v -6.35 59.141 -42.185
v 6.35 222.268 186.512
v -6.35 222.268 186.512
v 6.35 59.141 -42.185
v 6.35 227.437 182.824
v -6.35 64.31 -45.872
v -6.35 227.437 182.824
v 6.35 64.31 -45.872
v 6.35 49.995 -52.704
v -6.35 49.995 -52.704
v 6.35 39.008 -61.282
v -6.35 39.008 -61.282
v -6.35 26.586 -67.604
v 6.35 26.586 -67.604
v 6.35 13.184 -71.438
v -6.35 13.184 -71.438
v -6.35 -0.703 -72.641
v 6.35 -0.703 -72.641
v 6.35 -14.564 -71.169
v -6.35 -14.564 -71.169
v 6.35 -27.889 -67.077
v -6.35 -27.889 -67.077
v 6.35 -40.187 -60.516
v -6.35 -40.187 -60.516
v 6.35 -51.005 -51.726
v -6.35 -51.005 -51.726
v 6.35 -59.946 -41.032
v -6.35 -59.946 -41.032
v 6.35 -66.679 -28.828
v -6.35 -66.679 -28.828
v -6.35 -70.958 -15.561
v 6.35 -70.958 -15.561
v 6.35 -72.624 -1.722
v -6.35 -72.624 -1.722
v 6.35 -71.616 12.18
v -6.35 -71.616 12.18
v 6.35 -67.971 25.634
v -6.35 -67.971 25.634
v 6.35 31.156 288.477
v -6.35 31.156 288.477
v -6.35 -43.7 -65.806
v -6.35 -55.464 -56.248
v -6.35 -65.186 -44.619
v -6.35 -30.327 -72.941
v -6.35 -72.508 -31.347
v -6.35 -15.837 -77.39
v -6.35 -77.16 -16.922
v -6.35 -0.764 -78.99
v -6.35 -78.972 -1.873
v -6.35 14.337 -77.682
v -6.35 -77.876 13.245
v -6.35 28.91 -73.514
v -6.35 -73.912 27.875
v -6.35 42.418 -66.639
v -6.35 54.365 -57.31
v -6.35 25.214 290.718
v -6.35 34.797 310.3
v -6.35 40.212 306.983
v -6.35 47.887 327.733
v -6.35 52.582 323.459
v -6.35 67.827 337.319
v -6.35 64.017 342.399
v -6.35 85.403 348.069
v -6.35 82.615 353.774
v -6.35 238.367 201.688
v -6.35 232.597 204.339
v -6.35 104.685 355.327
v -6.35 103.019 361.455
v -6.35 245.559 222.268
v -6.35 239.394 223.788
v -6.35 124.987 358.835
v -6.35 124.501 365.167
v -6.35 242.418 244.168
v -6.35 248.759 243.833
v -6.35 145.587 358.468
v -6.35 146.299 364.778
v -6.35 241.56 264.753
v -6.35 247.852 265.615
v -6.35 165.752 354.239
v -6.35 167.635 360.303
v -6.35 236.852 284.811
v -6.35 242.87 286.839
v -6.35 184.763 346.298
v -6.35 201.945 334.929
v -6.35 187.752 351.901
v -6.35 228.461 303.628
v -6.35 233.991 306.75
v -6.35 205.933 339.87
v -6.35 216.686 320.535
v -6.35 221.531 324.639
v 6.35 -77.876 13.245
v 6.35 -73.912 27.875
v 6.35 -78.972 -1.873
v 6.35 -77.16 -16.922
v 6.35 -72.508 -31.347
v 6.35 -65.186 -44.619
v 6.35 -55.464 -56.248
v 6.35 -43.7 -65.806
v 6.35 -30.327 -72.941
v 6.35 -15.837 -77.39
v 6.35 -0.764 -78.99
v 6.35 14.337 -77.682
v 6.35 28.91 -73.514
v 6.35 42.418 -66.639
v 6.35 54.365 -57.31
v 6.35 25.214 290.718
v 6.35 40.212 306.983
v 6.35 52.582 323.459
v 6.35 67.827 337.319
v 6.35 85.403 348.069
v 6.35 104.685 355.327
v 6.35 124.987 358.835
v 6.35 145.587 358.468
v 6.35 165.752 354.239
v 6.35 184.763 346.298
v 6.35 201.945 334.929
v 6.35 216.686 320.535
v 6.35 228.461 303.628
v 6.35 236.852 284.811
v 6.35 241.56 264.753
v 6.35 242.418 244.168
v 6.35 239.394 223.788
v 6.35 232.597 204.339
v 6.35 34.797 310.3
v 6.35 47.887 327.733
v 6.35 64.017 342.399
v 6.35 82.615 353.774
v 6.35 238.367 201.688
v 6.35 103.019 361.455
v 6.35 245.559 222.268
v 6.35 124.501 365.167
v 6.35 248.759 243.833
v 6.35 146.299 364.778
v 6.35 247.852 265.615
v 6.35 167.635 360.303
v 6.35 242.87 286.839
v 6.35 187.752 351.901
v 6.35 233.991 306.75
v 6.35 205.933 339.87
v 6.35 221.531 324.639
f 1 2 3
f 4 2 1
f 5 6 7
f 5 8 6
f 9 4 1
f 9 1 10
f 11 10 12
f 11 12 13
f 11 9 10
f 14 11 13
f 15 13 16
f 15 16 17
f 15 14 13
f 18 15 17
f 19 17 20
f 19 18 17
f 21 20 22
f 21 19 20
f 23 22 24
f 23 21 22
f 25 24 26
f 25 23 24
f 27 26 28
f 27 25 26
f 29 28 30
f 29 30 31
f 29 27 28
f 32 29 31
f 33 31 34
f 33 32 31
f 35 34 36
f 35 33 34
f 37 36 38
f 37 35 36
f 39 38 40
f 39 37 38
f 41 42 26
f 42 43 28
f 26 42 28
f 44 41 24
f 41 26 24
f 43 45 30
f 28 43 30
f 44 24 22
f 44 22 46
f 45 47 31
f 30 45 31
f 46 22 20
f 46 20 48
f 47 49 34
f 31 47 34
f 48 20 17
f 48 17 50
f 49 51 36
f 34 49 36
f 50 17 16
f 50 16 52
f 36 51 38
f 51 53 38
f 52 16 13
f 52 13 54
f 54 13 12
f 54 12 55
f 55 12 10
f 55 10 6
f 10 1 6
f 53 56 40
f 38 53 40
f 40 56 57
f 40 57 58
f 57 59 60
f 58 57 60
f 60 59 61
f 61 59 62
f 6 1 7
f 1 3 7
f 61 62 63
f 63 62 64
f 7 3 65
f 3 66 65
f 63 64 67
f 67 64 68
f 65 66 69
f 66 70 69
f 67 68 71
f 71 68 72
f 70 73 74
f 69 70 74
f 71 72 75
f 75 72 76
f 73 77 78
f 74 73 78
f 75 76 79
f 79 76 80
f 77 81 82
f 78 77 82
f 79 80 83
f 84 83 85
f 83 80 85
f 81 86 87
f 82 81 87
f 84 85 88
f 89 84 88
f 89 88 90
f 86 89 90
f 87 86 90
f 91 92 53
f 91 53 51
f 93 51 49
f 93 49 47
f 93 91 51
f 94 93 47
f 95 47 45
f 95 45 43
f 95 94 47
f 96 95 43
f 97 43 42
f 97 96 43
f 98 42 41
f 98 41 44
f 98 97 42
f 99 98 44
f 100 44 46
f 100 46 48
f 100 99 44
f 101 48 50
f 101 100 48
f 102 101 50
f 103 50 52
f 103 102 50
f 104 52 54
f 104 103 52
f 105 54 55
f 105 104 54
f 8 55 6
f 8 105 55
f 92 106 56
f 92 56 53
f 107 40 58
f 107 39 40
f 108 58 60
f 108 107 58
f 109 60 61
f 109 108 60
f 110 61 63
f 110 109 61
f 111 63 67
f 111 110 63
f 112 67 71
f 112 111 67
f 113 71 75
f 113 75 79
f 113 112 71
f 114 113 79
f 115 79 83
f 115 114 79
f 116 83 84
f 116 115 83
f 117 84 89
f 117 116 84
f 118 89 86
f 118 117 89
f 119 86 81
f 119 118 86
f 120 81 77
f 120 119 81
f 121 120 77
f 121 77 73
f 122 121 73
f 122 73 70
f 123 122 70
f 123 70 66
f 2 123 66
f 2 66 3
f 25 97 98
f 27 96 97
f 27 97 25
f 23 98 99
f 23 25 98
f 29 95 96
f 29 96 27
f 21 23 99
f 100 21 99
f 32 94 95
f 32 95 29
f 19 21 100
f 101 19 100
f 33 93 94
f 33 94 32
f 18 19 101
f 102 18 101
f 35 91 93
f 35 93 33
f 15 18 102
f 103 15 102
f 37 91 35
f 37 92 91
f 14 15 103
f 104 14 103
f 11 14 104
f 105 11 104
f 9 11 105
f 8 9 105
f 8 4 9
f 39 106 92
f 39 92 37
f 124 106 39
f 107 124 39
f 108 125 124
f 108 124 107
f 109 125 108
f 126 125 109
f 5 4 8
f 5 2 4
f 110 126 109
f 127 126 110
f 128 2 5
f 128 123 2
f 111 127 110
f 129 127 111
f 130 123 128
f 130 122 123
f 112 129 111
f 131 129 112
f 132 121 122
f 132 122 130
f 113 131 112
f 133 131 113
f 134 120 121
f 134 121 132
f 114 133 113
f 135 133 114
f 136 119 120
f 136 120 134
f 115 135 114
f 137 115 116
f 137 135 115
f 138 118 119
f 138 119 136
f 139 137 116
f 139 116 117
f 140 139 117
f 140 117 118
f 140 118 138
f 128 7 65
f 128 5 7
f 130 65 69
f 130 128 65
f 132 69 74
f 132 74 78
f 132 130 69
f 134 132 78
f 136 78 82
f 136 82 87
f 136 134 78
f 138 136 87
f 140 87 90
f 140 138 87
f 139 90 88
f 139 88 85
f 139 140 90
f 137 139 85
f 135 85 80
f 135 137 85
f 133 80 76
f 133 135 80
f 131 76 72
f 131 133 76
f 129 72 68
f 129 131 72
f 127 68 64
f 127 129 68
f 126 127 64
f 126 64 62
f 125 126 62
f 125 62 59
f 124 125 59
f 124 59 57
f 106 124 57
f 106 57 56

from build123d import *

# Parameters (mm, degrees)
F1_DEPTH = 6.35


with BuildPart() as f1:
    # F0 (on Right) → F1 (new body, symmetric)
    with BuildSketch(Plane.YZ):
        with BuildLine():
            ThreePointArc((227.437395, 182.82425), (187.752017, 351.900923), (25.21449, 290.717568))
            Line((25.21449, 290.717568), (-73.912404, 27.874874))
            ThreePointArc((-73.912404, 27.874874), (-37.184675, -69.694705), (64.310285, -45.871988))
            Line((64.310285, -45.871988), (227.437395, 182.82425))
        make_face()
        with BuildLine():
            ThreePointArc((59.140648, -42.184529), (-34.195553, -64.092237), (-67.970892, 25.634128))
            Line((-67.970892, 25.634128), (31.156001, 288.476823))
            ThreePointArc((31.156001, 288.476823), (184.762895, 346.298454), (222.267758, 186.511709))
            Line((222.267758, 186.511709), (59.140648, -42.184529))
        make_face(mode=Mode.SUBTRACT)
    extrude(amount=F1_DEPTH, both=True)


solid = f1.part
